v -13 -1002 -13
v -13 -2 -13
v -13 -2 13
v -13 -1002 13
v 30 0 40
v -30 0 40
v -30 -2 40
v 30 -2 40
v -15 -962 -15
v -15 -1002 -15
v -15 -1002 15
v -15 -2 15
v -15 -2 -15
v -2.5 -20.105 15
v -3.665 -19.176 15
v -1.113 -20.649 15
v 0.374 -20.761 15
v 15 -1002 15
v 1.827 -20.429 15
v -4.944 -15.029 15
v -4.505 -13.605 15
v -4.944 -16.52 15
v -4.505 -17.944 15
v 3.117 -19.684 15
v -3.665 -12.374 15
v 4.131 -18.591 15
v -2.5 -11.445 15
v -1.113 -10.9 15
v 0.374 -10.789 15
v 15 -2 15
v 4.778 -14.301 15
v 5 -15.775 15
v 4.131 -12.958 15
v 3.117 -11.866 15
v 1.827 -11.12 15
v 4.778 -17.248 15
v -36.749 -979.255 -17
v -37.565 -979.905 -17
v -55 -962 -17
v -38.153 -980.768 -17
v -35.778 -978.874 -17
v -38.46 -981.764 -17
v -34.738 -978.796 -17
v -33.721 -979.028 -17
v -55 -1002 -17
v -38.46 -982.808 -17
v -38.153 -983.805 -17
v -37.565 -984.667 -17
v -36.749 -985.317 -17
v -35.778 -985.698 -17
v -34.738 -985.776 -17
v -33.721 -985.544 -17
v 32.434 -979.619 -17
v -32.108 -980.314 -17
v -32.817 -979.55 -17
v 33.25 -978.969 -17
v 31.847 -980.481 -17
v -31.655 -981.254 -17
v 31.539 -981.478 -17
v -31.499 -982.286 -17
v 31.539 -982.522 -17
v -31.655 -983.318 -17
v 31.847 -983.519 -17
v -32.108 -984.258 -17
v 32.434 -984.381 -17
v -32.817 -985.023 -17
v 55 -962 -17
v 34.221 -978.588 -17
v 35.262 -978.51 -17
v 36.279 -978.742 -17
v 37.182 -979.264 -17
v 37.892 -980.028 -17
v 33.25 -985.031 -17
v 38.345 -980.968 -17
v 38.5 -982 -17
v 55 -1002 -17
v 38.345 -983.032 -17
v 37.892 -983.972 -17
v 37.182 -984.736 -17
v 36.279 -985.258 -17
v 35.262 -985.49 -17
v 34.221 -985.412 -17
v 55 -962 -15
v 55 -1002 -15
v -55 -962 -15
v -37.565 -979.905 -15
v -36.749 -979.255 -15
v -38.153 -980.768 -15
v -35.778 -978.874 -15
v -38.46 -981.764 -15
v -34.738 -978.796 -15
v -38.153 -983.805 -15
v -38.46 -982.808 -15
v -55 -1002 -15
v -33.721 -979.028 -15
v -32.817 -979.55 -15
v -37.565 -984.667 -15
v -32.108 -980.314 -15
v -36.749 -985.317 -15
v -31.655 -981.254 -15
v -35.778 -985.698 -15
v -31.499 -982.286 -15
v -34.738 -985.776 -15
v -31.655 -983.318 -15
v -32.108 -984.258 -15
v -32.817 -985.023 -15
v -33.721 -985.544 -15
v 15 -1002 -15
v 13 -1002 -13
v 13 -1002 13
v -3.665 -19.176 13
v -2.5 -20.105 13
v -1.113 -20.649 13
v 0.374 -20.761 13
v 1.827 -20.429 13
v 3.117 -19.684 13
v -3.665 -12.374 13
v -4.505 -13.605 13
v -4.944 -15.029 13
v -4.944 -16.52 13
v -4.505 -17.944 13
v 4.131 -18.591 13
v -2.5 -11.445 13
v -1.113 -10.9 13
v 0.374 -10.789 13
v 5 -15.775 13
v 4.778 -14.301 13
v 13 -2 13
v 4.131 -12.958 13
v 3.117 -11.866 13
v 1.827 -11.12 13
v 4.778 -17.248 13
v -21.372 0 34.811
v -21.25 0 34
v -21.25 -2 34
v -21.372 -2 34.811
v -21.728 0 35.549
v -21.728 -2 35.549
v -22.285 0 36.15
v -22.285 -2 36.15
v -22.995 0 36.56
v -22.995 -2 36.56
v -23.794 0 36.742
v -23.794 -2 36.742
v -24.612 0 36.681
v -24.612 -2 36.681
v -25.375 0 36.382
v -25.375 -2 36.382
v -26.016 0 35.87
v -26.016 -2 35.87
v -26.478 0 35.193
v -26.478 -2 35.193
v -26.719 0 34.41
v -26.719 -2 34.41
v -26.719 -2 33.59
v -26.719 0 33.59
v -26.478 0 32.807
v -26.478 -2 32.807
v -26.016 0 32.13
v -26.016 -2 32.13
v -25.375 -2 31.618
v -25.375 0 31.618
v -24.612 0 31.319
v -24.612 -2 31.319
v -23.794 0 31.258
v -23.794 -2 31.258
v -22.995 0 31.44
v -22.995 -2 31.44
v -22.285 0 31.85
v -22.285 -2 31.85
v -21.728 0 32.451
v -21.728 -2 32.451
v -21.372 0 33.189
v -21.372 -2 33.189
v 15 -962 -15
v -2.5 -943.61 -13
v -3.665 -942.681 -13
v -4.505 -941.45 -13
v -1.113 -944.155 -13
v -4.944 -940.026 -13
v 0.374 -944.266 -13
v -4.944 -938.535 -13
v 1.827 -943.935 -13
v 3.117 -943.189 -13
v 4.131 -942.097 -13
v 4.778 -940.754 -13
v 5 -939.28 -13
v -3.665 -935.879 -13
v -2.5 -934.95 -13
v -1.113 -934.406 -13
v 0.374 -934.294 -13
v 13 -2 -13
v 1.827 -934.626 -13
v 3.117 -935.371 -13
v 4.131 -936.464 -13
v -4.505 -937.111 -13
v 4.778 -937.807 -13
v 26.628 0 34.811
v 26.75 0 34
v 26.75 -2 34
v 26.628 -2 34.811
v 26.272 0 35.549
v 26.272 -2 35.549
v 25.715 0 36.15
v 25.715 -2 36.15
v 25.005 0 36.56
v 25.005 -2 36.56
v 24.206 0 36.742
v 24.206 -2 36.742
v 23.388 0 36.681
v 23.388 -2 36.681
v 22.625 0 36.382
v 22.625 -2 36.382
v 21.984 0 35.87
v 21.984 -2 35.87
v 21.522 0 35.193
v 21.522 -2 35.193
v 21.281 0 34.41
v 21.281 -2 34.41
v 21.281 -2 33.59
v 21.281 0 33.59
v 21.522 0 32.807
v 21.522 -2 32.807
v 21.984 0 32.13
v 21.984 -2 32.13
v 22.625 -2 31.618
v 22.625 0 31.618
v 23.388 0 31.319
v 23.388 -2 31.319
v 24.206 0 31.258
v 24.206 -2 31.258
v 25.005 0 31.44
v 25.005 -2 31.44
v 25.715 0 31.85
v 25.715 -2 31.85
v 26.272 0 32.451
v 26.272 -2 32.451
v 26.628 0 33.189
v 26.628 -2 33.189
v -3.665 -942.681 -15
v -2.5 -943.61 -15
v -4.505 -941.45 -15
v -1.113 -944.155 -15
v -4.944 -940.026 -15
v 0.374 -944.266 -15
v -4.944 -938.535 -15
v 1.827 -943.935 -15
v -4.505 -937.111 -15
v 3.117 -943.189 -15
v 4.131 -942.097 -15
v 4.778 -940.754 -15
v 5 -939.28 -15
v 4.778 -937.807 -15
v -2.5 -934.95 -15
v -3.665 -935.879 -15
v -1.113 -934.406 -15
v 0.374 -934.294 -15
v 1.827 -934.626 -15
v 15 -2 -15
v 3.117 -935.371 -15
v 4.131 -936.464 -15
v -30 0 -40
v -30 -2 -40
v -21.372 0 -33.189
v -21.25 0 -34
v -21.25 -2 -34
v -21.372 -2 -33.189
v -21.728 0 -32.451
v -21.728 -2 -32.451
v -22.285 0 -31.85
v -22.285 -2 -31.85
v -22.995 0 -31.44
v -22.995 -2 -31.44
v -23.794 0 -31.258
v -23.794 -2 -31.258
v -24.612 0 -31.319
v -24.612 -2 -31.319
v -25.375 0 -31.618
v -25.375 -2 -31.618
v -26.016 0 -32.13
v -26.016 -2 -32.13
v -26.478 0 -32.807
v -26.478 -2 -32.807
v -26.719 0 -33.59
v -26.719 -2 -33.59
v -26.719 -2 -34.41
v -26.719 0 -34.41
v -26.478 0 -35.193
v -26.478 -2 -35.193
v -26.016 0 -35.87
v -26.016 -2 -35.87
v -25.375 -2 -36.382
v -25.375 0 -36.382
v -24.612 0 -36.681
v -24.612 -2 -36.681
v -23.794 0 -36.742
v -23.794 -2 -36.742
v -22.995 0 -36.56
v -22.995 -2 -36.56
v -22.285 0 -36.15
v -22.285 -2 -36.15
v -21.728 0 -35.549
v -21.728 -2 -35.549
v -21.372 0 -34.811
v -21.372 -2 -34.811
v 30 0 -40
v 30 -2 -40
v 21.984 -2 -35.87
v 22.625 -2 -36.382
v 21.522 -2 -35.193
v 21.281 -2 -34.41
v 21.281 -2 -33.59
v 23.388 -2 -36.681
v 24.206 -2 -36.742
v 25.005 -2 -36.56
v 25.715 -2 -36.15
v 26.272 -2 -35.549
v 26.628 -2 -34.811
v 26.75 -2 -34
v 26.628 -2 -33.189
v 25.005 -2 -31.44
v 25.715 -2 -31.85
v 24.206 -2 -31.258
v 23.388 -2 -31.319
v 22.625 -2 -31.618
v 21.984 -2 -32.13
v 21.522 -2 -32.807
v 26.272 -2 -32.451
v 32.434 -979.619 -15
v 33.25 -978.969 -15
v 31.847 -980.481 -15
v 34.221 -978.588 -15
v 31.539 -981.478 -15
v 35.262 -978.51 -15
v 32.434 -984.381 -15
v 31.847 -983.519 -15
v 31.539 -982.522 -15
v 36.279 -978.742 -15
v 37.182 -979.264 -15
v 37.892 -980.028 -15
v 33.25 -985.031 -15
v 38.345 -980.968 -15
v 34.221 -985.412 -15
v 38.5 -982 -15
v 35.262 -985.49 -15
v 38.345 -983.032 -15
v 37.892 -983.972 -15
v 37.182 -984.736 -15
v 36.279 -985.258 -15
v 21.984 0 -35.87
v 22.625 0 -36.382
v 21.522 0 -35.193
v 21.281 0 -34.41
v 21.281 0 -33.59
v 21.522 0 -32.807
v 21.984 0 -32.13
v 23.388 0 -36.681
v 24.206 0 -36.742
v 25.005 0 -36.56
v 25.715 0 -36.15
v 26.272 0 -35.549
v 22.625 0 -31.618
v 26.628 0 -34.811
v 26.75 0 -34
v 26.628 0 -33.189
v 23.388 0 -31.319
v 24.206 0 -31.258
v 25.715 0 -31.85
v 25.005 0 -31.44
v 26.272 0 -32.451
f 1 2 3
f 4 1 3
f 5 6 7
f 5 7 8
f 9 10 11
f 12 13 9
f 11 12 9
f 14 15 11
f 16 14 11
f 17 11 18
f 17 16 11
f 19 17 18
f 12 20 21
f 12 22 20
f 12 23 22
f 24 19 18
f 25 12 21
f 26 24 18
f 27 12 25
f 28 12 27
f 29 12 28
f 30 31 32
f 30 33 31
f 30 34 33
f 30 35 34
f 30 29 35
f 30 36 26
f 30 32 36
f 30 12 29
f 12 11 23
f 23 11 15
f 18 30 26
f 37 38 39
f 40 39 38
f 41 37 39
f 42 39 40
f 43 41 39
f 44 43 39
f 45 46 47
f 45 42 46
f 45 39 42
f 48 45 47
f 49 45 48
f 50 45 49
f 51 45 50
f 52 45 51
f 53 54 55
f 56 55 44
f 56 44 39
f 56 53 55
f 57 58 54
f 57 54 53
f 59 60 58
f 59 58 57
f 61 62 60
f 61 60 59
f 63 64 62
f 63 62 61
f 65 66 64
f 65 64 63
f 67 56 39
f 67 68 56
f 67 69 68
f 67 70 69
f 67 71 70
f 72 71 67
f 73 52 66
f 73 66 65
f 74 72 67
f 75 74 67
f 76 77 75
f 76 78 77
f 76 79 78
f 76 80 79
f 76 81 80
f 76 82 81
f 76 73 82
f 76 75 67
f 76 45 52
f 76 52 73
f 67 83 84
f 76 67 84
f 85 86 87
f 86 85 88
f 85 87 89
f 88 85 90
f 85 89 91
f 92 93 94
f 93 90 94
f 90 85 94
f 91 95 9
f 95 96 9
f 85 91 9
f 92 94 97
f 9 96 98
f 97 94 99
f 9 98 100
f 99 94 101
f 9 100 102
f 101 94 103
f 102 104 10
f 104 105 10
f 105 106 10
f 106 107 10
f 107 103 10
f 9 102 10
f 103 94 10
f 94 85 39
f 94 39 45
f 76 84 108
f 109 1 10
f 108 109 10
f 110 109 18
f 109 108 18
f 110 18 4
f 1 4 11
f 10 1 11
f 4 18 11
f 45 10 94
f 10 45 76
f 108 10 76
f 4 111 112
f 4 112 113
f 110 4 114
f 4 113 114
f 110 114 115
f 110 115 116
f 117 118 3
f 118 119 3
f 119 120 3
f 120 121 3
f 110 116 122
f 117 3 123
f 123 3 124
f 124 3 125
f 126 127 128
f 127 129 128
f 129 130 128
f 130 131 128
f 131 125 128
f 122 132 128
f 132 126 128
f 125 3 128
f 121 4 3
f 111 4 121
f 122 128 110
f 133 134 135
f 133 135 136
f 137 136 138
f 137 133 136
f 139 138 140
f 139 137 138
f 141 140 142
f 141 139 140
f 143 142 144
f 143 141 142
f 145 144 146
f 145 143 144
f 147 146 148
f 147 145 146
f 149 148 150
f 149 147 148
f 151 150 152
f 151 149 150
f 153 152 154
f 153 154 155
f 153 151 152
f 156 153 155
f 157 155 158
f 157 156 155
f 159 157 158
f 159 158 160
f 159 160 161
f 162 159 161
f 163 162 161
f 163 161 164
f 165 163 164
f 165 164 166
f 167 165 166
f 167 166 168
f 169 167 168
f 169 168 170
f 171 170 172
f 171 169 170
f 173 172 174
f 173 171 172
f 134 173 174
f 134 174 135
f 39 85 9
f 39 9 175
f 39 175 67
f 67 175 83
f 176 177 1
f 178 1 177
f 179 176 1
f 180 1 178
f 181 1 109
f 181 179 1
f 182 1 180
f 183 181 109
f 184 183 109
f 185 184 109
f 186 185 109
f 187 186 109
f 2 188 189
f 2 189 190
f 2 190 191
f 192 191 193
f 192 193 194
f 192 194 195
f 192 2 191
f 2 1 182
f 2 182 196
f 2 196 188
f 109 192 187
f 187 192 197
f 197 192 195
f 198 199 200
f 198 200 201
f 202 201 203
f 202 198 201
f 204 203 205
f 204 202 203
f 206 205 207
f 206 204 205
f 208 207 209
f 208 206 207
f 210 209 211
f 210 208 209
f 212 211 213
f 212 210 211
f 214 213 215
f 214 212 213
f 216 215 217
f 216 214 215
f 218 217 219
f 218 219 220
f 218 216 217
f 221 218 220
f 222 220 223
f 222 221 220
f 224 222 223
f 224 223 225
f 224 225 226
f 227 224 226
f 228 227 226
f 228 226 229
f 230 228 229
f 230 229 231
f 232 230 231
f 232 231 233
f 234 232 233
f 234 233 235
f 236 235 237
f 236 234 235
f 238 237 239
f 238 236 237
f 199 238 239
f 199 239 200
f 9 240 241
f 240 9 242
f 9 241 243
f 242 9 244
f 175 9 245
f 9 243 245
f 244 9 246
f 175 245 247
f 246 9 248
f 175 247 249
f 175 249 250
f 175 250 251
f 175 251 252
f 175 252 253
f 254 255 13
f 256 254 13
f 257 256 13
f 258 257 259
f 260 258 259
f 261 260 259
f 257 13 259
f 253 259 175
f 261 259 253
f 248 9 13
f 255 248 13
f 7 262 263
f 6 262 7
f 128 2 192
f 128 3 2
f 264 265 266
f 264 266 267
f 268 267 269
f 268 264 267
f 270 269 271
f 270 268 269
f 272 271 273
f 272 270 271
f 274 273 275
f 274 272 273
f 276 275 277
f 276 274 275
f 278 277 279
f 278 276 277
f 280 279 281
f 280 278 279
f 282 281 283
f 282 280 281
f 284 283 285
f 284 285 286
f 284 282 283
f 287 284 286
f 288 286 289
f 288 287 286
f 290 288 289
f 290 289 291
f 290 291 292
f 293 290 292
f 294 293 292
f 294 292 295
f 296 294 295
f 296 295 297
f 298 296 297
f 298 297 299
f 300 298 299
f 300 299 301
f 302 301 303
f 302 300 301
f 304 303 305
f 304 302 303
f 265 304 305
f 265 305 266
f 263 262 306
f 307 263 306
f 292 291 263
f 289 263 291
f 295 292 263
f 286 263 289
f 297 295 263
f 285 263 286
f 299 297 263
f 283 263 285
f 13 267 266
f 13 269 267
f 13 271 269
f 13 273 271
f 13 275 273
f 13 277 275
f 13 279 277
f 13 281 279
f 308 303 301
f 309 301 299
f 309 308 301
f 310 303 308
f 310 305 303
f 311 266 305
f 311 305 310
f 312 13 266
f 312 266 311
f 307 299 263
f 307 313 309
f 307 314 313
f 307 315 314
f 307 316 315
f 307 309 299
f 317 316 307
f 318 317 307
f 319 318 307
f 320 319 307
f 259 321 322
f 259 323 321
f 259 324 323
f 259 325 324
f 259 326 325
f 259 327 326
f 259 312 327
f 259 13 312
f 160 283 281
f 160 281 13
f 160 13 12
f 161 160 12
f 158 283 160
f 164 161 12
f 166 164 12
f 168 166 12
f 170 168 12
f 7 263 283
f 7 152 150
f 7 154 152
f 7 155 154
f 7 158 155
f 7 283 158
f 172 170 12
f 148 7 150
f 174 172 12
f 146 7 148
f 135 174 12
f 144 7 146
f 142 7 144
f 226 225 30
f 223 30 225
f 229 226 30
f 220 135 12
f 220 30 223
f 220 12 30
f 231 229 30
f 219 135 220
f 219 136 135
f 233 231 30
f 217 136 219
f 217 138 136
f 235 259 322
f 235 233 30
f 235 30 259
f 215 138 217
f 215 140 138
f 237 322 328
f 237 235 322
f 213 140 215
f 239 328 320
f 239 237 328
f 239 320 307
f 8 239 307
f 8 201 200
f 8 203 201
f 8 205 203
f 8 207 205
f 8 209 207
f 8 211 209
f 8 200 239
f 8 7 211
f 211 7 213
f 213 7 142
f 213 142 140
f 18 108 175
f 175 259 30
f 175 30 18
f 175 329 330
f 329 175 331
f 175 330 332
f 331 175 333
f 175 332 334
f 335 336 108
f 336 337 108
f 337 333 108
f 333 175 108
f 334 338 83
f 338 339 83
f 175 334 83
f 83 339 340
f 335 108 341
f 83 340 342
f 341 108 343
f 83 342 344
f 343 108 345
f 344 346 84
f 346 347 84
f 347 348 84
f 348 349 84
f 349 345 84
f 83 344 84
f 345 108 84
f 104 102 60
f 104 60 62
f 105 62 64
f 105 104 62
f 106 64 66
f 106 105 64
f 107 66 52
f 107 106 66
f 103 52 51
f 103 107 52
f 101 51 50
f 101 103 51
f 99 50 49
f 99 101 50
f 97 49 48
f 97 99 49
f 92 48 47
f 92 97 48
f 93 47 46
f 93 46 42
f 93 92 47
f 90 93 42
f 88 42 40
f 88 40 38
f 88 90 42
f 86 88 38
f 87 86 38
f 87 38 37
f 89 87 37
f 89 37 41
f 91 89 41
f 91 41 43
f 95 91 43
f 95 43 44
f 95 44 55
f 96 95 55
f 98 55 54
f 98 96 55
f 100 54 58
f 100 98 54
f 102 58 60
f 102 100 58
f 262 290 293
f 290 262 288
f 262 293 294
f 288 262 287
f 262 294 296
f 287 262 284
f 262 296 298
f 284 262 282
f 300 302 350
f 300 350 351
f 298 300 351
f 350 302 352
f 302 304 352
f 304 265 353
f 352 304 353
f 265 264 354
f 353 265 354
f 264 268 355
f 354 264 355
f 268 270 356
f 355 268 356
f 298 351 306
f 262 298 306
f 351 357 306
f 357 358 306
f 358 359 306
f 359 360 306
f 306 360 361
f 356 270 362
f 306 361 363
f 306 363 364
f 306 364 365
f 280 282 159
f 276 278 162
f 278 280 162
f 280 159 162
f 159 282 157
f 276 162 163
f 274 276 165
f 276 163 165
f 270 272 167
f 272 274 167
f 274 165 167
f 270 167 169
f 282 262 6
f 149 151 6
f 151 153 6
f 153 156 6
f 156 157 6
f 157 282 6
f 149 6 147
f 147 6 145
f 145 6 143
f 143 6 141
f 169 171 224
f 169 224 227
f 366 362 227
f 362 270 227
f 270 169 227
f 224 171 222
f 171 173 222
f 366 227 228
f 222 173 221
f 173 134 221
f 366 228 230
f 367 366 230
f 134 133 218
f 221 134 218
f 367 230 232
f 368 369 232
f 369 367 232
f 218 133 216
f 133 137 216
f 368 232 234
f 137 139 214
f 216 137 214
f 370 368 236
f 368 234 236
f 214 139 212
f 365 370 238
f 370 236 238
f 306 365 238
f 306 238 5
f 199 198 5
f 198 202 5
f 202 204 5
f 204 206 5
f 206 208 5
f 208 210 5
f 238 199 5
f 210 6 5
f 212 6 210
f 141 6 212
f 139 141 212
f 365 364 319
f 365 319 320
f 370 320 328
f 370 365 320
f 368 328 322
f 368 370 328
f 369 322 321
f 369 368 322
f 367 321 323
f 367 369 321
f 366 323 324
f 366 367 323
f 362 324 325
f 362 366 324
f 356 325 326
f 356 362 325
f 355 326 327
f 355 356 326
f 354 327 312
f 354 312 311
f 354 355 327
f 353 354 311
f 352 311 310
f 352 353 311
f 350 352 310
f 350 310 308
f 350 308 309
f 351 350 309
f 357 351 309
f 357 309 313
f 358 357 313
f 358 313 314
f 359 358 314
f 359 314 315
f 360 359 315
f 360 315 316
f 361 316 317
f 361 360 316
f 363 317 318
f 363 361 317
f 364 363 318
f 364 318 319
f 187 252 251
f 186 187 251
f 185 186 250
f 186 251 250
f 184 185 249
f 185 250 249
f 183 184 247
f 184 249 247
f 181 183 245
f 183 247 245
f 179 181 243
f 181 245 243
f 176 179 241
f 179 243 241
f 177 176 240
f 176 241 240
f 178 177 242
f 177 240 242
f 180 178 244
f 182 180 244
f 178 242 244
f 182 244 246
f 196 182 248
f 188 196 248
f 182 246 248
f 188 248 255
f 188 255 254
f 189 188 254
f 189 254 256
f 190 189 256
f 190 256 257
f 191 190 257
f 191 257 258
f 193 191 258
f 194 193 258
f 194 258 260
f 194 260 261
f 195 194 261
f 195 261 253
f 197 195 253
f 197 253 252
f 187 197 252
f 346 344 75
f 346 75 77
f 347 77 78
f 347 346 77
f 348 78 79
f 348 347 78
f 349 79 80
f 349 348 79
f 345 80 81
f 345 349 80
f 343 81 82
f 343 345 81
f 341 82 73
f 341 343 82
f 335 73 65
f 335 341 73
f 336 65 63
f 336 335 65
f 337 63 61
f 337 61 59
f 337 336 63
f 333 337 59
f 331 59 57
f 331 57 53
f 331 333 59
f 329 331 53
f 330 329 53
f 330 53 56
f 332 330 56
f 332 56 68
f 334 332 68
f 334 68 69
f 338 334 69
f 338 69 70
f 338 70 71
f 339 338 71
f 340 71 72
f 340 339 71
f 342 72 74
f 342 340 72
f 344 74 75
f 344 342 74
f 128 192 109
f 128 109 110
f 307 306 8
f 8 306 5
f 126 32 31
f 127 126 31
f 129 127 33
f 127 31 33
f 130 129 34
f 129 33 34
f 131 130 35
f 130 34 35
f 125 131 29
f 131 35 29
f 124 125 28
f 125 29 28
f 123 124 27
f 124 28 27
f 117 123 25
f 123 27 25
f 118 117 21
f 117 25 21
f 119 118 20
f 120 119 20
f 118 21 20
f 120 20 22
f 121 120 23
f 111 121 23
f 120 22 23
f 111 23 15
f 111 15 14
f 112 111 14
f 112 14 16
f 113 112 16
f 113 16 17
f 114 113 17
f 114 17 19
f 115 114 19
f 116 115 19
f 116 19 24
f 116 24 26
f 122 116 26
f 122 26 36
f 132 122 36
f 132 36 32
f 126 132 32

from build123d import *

# Parameters (mm, degrees)
F0_W     = 60
F0_H     = 80
F0_R     = 2.75
F1_DEPTH = 2
F2_W     = 30
F2_H     = 30
F2_W_2   = 26
F2_H_2   = 26
F3_DEPTH = 1002
F4_R     = 5
F5_DEPTH = 5
F6_W     = 40
F6_H     = 40
F6_R     = 3.5
F6_W_2   = 30
F7_DEPTH = 2
F6_R_2   = 5
F8_DEPTH = 5


with BuildPart() as f1:
    # F0 (on Front) → F1 (new body)
    with BuildSketch(Plane.XZ):
        Rectangle(F0_W, F0_H)
        with Locations((-24, -34)):
            Circle(F0_R, mode=Mode.SUBTRACT)
        with Locations((24, -34)):
            Circle(F0_R, mode=Mode.SUBTRACT)
        with Locations((-24, 34)):
            Circle(F0_R, mode=Mode.SUBTRACT)
        with Locations((24, 34)):
            Circle(F0_R, mode=Mode.SUBTRACT)
    extrude(amount=F1_DEPTH)

    # F2 (on Front) → F3 (join)
    with BuildSketch(Plane.XZ):
        Rectangle(F2_W, F2_H)
        Rectangle(F2_W_2, F2_H_2, mode=Mode.SUBTRACT)
    extrude(amount=F3_DEPTH)

    # F4 (on face) → F5 (cut)
    with BuildSketch(Plane.XY.offset(15)):
        with Locations((0, -15.7746840268)):
            Circle(F4_R)
    extrude(amount=-F5_DEPTH, mode=Mode.SUBTRACT)

    # F6 (on face) → F7 (join)
    with BuildSketch(Plane(origin=(0, 0, -15), x_dir=(1, 0, 0), z_dir=(0, 0, -1))):
        with Locations((35, 982)):
            Rectangle(F6_W, F6_H)
        with Locations((35, 982)):
            Circle(F6_R, mode=Mode.SUBTRACT)
        with Locations((0, 982)):
            Rectangle(F6_W_2, F6_H)
        with Locations((-35, 982)):
            Rectangle(F6_W, F6_H)
        with Locations((-34.9994153271, 982.2861011526)):
            Circle(F6_R, mode=Mode.SUBTRACT)
    extrude(amount=F7_DEPTH)

    # F6 (on face) → F8 (cut)
    with BuildSketch(Plane(origin=(0, 0, -15), x_dir=(1, 0, 0), z_dir=(0, 0, -1))):
        with Locations((0, 939.2803311348)):
            Circle(F6_R_2)
    extrude(amount=-F8_DEPTH, mode=Mode.SUBTRACT)


solid = f1.part
